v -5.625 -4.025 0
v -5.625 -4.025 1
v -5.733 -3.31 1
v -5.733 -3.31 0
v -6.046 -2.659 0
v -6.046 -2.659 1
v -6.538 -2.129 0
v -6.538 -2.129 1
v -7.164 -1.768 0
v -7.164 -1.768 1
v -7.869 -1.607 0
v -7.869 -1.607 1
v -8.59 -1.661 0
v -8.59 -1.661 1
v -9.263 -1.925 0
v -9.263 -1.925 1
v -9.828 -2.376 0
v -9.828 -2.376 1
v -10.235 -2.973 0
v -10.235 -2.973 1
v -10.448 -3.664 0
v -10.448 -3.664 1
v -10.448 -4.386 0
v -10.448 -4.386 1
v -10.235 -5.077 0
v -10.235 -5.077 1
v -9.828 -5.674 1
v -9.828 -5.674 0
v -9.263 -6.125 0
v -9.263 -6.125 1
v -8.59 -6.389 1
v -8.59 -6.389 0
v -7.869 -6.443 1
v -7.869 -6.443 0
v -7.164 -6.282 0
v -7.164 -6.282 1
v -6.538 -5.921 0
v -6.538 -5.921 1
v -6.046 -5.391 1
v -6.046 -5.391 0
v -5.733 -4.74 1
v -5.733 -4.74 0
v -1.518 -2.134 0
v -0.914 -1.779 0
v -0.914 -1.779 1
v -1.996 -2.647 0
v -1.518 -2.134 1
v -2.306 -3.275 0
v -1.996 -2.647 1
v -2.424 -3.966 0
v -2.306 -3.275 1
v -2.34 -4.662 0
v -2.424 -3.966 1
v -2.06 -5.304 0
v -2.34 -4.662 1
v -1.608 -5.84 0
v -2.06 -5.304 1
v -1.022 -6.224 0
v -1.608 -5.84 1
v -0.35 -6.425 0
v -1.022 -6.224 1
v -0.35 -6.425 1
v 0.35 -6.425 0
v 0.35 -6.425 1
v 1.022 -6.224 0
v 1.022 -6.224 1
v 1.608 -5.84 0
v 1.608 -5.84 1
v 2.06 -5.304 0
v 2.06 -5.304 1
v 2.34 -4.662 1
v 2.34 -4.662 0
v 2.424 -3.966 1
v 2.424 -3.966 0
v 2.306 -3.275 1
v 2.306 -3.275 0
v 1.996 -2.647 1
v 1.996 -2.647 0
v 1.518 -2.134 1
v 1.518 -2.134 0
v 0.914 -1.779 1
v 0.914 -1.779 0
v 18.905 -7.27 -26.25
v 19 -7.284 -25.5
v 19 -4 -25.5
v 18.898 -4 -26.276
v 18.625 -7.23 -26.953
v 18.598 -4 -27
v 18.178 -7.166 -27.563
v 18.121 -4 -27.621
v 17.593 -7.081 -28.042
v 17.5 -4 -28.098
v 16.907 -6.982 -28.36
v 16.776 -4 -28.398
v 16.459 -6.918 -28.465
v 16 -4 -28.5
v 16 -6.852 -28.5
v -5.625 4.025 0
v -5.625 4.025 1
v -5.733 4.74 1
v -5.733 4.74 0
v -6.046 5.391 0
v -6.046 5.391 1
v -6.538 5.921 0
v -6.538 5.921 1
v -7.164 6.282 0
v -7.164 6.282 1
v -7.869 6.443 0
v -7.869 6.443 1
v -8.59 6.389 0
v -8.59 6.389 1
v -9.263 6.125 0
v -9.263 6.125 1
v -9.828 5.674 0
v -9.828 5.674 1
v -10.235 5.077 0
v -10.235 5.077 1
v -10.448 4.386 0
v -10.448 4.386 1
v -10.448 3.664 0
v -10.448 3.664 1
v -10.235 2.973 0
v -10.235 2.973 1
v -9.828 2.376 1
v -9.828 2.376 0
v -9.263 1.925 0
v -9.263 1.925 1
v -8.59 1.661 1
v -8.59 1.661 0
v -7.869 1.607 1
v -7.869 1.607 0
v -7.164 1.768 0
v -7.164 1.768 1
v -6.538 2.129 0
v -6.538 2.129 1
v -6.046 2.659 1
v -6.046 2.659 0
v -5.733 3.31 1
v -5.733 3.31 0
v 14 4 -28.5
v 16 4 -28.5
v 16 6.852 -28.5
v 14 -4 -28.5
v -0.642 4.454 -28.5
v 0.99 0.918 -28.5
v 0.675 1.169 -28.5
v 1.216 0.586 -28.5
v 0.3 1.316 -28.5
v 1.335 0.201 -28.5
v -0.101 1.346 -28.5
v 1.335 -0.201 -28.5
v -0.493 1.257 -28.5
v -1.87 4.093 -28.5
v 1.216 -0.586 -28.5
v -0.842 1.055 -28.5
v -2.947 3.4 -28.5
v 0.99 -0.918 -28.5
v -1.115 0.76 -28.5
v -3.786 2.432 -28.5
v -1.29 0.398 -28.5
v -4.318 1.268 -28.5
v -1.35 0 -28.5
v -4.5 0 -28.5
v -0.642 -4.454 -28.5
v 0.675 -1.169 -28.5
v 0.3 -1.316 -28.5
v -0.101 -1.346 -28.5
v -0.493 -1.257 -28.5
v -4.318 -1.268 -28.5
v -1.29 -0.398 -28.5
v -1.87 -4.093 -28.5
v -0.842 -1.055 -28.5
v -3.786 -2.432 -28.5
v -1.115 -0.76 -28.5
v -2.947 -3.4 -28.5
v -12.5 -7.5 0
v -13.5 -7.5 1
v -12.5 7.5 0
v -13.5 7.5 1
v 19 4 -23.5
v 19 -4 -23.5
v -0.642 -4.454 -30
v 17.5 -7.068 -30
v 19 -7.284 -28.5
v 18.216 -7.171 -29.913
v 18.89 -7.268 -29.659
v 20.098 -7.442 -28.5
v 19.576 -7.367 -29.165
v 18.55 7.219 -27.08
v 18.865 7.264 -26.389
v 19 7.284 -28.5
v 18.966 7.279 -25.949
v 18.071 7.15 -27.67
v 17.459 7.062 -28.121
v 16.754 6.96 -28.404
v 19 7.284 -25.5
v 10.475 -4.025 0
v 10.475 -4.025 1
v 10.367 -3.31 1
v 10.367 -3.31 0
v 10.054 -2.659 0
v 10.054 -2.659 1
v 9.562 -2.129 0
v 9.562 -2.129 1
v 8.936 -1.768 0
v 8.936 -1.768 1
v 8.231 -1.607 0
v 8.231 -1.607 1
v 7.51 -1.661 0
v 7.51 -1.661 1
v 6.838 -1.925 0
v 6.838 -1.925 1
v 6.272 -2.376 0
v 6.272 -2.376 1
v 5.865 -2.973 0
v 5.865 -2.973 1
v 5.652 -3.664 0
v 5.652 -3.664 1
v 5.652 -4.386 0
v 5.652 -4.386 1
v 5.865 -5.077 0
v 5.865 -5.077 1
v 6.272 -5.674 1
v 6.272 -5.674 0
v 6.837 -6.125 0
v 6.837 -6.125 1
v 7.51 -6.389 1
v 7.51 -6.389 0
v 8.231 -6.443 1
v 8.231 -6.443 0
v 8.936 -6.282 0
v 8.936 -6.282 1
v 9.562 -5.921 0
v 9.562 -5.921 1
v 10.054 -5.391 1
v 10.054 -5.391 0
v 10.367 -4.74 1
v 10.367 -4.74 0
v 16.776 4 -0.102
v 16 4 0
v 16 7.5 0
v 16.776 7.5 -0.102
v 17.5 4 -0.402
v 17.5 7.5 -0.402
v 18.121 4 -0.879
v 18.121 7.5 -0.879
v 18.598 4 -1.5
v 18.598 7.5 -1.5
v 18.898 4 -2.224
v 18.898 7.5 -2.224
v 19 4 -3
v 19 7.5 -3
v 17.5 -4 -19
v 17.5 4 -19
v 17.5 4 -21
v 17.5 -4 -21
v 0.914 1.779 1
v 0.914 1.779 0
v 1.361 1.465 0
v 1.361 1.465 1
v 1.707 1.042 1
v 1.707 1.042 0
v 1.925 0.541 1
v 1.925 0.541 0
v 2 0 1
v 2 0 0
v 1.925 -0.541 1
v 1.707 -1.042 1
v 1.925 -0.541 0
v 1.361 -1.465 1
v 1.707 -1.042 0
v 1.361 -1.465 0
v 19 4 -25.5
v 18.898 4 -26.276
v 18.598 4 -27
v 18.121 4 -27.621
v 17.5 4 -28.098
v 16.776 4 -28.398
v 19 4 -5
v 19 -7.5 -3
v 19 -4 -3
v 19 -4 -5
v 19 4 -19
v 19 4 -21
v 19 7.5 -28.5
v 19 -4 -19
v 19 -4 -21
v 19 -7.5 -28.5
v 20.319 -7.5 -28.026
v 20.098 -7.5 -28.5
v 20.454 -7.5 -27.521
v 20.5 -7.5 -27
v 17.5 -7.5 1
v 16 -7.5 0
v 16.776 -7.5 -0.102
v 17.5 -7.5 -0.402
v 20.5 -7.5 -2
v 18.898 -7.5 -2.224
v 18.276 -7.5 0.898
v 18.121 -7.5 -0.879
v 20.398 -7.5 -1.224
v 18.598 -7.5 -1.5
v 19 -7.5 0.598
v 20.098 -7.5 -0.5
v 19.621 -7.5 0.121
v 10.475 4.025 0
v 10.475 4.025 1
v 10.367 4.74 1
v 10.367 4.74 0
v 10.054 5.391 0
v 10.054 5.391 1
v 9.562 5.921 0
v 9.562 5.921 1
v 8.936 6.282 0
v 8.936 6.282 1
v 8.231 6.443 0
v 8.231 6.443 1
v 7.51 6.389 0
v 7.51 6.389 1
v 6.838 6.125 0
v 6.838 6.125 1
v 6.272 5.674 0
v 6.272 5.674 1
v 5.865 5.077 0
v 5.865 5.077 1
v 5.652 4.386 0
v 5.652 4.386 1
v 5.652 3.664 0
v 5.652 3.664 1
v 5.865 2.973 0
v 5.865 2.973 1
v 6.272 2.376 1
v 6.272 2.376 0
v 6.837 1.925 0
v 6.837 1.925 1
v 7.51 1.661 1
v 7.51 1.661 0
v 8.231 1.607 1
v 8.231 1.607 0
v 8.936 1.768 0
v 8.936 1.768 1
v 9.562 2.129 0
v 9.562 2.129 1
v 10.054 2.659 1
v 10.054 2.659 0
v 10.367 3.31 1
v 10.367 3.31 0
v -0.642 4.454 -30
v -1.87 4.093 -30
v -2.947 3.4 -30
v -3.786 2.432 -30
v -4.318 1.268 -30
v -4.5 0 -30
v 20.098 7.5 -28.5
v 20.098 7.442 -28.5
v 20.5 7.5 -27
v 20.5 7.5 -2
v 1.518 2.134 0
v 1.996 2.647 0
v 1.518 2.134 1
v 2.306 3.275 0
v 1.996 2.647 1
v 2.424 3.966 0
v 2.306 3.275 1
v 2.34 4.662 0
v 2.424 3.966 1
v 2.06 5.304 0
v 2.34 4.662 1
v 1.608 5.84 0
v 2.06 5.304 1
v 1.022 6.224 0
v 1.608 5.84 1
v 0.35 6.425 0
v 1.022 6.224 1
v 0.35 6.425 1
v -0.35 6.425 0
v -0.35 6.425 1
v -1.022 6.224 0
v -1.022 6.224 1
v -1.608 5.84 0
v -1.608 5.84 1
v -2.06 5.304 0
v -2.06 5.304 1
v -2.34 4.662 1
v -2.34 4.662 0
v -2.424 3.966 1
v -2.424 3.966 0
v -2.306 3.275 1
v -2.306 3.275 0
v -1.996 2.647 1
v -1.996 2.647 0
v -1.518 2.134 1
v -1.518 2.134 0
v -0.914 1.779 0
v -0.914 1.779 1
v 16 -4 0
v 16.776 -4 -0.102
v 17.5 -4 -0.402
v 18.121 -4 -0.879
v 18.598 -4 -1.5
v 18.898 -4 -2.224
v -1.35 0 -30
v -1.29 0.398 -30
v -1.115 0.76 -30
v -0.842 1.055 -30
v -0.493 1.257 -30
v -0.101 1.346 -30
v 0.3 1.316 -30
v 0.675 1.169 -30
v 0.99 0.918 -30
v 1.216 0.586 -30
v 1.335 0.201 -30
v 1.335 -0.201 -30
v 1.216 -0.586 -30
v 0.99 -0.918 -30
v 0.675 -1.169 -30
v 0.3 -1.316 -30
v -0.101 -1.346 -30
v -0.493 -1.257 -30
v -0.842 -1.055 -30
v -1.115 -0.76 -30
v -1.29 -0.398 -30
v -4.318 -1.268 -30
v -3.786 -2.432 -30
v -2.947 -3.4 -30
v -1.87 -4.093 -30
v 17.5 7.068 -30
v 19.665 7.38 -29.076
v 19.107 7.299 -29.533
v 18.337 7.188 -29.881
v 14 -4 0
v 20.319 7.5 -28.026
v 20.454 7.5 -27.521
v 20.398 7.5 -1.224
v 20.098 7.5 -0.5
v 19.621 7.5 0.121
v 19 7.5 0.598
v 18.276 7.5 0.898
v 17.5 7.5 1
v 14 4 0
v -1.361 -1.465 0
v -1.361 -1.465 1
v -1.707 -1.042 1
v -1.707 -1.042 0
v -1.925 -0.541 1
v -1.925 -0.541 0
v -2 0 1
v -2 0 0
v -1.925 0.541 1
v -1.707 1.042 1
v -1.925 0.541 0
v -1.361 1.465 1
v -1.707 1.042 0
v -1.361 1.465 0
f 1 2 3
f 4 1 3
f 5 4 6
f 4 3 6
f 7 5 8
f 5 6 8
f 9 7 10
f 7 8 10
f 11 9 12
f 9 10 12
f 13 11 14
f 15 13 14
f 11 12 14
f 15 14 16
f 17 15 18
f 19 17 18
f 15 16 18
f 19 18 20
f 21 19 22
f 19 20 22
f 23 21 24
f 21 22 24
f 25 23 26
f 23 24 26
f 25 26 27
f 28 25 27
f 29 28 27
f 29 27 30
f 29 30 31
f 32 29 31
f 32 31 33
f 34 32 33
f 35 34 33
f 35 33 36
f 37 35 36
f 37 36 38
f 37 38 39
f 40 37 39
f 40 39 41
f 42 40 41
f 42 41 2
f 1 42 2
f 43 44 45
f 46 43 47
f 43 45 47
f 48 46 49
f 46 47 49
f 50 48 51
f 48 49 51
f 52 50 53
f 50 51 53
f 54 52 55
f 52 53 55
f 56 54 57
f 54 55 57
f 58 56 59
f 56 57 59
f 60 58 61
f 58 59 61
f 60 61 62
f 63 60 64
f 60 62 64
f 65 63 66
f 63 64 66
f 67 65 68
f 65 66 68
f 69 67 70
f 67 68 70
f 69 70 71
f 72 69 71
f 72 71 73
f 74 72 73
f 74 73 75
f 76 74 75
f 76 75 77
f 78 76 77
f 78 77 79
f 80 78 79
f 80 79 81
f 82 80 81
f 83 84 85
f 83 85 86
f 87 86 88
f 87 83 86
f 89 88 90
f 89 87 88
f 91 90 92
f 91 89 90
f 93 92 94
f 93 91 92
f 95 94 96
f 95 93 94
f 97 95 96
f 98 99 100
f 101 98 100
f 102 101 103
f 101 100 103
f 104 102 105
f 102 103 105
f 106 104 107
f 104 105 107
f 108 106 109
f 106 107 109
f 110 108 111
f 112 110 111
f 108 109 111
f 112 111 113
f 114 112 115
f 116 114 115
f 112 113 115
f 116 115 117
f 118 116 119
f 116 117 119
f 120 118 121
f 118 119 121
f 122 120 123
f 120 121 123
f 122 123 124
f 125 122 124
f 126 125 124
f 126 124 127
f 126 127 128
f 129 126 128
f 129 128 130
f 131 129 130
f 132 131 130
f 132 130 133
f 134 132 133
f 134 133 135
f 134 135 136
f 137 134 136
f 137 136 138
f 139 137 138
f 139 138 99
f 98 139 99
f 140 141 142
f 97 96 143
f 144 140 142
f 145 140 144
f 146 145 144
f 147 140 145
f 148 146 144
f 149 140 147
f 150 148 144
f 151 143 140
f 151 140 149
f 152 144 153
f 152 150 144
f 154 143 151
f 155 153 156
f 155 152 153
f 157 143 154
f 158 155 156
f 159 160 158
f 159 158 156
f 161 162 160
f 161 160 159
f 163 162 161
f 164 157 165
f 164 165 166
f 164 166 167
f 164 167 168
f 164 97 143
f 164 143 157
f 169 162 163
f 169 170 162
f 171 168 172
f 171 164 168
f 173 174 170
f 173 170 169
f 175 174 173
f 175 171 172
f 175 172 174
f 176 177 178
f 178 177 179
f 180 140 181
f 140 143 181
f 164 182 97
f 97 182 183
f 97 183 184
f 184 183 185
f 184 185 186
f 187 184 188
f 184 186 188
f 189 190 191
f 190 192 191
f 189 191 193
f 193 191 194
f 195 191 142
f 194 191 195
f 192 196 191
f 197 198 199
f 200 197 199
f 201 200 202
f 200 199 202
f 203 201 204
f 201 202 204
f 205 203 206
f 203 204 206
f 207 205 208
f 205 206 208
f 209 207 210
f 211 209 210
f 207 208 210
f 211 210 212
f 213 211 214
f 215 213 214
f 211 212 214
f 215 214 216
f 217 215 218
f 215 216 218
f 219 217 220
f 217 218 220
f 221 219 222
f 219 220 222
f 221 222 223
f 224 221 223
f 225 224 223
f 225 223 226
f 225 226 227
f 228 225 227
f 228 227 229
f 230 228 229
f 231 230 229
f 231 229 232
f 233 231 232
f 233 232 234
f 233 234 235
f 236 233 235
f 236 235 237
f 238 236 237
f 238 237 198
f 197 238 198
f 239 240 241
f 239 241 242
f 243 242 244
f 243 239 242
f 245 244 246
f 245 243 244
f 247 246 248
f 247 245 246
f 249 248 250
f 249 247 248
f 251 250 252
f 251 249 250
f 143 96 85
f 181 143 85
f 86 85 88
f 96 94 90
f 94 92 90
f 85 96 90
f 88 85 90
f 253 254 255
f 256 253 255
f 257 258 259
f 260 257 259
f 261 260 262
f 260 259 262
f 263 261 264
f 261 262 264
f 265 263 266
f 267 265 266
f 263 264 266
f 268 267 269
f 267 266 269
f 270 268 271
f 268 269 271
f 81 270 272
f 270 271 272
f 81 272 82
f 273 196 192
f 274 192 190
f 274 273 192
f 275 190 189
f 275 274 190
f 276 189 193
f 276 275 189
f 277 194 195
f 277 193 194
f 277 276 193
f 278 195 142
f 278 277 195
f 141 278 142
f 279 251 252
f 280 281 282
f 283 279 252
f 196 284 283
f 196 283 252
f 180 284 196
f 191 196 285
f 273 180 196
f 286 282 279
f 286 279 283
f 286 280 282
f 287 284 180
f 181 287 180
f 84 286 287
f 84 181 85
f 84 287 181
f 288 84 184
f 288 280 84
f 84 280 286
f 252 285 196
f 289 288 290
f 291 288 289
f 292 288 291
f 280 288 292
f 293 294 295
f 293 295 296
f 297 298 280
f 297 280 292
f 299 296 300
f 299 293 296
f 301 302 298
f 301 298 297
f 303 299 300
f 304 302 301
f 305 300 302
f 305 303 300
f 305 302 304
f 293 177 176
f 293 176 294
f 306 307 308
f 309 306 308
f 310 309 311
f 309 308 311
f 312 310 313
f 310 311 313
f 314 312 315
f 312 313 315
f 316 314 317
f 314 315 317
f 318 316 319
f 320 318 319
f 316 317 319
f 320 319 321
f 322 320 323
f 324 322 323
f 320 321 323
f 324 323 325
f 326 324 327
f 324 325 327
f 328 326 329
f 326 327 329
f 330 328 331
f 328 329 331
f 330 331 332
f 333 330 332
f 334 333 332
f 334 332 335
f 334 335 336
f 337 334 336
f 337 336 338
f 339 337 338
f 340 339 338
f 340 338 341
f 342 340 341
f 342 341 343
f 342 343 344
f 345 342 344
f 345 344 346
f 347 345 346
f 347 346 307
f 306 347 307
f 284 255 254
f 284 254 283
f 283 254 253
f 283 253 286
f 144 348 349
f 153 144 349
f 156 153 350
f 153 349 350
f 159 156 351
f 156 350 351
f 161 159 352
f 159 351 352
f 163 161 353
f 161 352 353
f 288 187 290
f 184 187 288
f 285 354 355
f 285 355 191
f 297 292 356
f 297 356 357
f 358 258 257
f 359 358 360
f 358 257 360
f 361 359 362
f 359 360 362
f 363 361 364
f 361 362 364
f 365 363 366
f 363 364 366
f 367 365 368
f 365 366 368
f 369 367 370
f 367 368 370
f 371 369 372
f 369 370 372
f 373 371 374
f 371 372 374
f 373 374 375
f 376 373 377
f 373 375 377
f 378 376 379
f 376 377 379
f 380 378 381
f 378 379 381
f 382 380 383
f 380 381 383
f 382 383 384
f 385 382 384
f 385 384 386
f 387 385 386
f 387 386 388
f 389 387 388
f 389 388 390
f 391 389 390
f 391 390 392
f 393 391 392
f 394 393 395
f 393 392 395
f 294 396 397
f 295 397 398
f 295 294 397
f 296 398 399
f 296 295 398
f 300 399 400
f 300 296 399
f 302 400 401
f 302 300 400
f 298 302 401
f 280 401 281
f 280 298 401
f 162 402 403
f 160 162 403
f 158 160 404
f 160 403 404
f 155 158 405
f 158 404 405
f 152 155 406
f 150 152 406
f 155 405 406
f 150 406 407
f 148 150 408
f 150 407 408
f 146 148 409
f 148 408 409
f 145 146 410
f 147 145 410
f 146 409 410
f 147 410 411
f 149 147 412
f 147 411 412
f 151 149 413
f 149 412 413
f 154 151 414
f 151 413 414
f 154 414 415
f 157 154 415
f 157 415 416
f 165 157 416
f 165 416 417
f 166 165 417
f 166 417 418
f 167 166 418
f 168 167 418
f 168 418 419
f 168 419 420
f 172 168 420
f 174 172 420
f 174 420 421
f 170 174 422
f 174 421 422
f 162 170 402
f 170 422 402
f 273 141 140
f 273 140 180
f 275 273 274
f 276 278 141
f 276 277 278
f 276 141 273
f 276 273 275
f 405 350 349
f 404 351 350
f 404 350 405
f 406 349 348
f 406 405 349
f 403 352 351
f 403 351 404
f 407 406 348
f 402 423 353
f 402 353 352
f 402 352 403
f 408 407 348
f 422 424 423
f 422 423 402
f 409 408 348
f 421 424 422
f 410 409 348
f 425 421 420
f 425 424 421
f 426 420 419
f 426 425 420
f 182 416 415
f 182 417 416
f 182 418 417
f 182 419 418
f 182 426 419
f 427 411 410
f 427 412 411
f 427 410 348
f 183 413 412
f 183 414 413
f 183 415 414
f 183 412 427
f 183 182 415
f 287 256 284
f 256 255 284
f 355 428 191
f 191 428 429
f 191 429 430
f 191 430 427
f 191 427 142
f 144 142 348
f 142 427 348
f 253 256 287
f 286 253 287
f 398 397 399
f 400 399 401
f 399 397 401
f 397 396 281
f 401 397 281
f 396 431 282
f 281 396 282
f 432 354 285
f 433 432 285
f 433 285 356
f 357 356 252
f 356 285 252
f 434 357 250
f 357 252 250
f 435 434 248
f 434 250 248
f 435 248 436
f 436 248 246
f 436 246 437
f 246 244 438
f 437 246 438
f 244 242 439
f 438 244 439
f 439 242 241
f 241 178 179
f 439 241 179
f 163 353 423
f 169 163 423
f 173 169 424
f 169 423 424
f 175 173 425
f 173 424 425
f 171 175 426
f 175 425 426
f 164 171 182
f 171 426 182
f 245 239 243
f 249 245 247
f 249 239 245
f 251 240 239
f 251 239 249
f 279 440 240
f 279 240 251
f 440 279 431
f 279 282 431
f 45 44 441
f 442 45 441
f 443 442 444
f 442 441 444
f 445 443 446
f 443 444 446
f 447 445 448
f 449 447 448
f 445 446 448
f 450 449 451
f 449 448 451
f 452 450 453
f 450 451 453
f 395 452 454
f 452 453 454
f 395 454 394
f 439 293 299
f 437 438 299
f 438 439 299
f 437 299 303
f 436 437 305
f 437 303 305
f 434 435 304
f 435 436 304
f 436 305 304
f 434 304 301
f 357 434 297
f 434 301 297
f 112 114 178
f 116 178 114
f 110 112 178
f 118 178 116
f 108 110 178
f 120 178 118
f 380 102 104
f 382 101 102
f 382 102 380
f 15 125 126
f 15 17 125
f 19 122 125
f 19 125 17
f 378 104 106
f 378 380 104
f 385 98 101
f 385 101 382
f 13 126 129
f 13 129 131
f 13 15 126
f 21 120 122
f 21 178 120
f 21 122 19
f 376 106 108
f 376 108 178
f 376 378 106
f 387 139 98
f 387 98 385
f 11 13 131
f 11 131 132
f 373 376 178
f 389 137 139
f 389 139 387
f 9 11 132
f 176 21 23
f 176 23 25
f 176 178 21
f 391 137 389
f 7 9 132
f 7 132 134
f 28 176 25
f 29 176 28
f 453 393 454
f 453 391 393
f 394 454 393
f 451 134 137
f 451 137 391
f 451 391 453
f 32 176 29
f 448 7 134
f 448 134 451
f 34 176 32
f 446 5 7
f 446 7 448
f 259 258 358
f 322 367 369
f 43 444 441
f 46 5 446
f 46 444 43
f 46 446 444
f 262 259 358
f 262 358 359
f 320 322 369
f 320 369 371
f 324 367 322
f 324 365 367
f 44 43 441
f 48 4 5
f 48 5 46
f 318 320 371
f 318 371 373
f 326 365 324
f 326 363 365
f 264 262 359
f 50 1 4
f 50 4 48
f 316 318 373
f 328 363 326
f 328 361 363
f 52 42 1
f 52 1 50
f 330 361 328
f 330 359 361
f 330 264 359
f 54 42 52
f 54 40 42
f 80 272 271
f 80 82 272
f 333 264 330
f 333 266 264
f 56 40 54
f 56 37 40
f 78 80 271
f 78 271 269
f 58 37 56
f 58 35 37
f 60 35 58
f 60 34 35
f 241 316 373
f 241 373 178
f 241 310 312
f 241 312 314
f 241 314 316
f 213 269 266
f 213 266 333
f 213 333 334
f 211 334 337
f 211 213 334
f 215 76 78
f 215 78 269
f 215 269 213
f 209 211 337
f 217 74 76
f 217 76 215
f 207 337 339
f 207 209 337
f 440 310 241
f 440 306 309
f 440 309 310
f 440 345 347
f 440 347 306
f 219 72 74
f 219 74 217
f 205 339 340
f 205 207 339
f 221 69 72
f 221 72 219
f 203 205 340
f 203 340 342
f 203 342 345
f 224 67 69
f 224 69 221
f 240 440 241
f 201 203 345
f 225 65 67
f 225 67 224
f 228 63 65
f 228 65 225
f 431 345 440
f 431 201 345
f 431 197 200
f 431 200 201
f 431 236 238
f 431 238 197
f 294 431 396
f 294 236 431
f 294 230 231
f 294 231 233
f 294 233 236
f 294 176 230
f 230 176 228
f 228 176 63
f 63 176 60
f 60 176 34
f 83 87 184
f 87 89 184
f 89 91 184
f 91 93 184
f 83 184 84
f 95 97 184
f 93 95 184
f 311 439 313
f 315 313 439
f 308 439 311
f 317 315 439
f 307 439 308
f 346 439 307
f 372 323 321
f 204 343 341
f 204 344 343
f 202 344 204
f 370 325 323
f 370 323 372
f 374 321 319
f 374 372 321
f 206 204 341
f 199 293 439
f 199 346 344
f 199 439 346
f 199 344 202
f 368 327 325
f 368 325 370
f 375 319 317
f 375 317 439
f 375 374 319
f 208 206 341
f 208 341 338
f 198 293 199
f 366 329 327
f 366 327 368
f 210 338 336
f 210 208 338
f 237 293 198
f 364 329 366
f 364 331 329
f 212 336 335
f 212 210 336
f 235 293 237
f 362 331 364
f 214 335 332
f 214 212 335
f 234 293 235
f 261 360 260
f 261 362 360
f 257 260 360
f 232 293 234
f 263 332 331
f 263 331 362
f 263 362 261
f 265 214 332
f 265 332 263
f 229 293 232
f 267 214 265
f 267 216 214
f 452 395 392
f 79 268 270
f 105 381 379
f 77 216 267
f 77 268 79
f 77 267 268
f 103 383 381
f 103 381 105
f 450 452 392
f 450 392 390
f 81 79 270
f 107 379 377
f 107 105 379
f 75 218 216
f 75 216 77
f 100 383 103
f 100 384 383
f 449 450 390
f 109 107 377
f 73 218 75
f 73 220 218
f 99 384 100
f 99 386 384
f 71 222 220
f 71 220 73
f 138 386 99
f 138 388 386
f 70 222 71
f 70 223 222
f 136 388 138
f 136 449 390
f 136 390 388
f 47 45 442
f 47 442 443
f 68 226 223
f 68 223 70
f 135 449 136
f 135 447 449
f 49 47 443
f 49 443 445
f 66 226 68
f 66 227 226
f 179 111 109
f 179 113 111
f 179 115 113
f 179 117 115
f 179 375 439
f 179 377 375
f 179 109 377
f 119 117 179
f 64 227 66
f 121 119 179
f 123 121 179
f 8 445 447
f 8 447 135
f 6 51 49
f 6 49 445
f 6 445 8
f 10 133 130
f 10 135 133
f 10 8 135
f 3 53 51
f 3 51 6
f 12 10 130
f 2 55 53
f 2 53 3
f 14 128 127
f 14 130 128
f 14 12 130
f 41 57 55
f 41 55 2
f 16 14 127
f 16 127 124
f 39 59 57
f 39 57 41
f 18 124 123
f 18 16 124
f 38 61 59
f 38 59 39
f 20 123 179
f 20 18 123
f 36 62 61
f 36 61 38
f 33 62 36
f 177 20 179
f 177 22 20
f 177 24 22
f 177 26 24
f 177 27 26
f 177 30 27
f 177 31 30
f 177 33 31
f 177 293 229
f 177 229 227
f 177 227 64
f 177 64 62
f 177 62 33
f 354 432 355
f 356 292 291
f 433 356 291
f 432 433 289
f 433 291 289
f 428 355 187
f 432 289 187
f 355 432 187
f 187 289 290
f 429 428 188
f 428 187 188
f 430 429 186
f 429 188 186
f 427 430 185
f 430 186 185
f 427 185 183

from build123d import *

# Parameters (mm, degrees)
SKETCH_1_W          = 27
SKETCH_1_H          = 15
EXTRUDE_1_DEPTH     = 1
SKETCH_2_R          = 2.425
CUT_EXTRUDE_1_DEPTH = 16.475787541
EXTRUDE_2_DEPTH     = 15
SKETCH_6_W          = 1.5
SKETCH_6_H          = 2
EXTRUDE_3_DEPTH     = 4
SKETCH_7_R          = 1.35
CUT_EXTRUDE_3_DEPTH = 1.5
FILLET_1_R          = 3
CHAMFER_1_SIZE      = 1
CUT_EXTRUDE_4_REACH = 39.101
SKETCH_8_R          = 2


# Some blends are built 0.0001 mm under size
with BuildPart() as part:
    # 草图1 → 凸台-拉伸1 (new body)
    with BuildSketch(Plane.XY):
        Rectangle(SKETCH_1_W, SKETCH_1_H)
    extrude(amount=EXTRUDE_1_DEPTH)

    # 草图2 → 切除-拉伸1 (cut, through all)
    with BuildSketch(Plane.XY.offset(1)):
        with Locations((0, 4.025)):
            Circle(SKETCH_2_R)
        with Locations((0, -4.025)):
            Circle(SKETCH_2_R)
        with Locations((8.05, 4.025)):
            Circle(SKETCH_2_R)
        with Locations((8.05, -4.025)):
            Circle(SKETCH_2_R)
        with Locations((-8.05, 4.025)):
            Circle(SKETCH_2_R)
        with Locations((-8.05, -4.025)):
            Circle(SKETCH_2_R)
    extrude(amount=-CUT_EXTRUDE_1_DEPTH, mode=Mode.SUBTRACT)

    # 草图3 → 凸台-拉伸2 (add)
    with BuildSketch(Plane.XZ.offset(7.5)):
        Polygon((13.5, 0), (19, 0), (19, -28.5), (-4.5, -28.5), (-4.5, -30), (20.5, -30), (20.5, 1), (13.5, 1), align=None)
    extrude(amount=-EXTRUDE_2_DEPTH)

    # 草图6 → 凸台-拉伸3 (add, symmetric)
    with BuildSketch(Plane(origin=(0, 0, 0), x_dir=(1, 0, 0), z_dir=(0, 1, 0))):
        Polygon((19, 0), (19, 5), (14, 0), align=None)
        Polygon((19, 28.5), (14, 28.5), (19, 23.5), align=None)
        with Locations((18.25, 20)):
            Rectangle(SKETCH_6_W, SKETCH_6_H)
    extrude(amount=EXTRUDE_3_DEPTH, both=True)

    # 草图7 → 切除-拉伸3 (cut)
    with BuildSketch(Plane(origin=(0, 0, -30), x_dir=(-1, 0, 0), z_dir=(0, 0, -1))):
        with BuildLine():
            ThreePointArc((4.5, 0), (3.401301202, -2.946379157), (0.641711051, -4.454010207))
            Line((0.641711051, -4.454010207), (-20.5, -7.5))
            Line((-20.5, -7.5), (4.5, -7.5))
            Line((4.5, -7.5), (4.5, 0))
        make_face()
        with BuildLine():
            Line((-20.5, 7.5), (0.641711051, 4.454010207))
            ThreePointArc((0.641711051, 4.454010207), (3.401301202, 2.946379157), (4.5, 0))
            Line((4.5, 0), (4.5, 7.5))
            Line((4.5, 7.5), (-20.5, 7.5))
        make_face()
        Circle(SKETCH_7_R)
    extrude(amount=-CUT_EXTRUDE_3_DEPTH, mode=Mode.SUBTRACT)

    # 圆角1
    # the kernel refuses this fillet: 3 mm, written as the material it adds along each edge
    with BuildSketch(Plane(origin=(19, -3.5, -28.5), x_dir=(-1, 0, 0), z_dir=(0, 1, 0))) as fillet_1_piece_1_section:
        with BuildLine():
            CenterArc((FILLET_1_R, FILLET_1_R), FILLET_1_R, 180, 90)
            Line((0, FILLET_1_R), (0, 0))
            Line((0, 0), (FILLET_1_R, 0))
        make_face()
    fillet_1_piece_1 = extrude(amount=18.283887658, mode=Mode.PRIVATE)
    fillet_1_piece_1 = split(fillet_1_piece_1, bisect_by=Plane(origin=(18.119115161, 7.156974268, -27.821481802), z_dir=(0.1426024558755584, -0.9897800460598605, 0)), keep=Keep.TOP, mode=Mode.PRIVATE)
    add(fillet_1_piece_1)
    with BuildSketch(Plane(origin=(19, -3.5, 0), x_dir=(0, 0, -1), z_dir=(0, 1, 0)), Plane(origin=(19, -7.5, 0), x_dir=(0, 0, -1), z_dir=(0, 1, 0))) as fillet_1_piece_2:
        with BuildLine():
            CenterArc((FILLET_1_R, FILLET_1_R), FILLET_1_R, 180, 90)
            Line((0, FILLET_1_R), (0, 0))
            Line((0, 0), (FILLET_1_R, 0))
        make_face()
    extrude(amount=11)
    with BuildSketch(Plane(origin=(19, -14.783887658, -28.5), x_dir=(-1, 0, 0), z_dir=(0, 1, 0))) as fillet_1_piece_3_section:
        with BuildLine():
            CenterArc((FILLET_1_R, FILLET_1_R), FILLET_1_R, 180, 90)
            Line((0, FILLET_1_R), (0, 0))
            Line((0, 0), (FILLET_1_R, 0))
        make_face()
    fillet_1_piece_3 = extrude(amount=18.283887658, mode=Mode.PRIVATE)
    fillet_1_piece_3 = split(fillet_1_piece_3, bisect_by=Plane(origin=(18.119115161, -7.156974268, -27.821481802), z_dir=(0.1426024558755584, 0.9897800460598605, 0)), keep=Keep.TOP, mode=Mode.PRIVATE)
    add(fillet_1_piece_3)
    # the kernel refuses this fillet: 3 mm, written as the material it takes off along each edge
    with BuildSketch(Plane(origin=(20.5, -15, 1), x_dir=(0, 0, -1), z_dir=(0, 1, 0))) as fillet_1_2_piece_1:
        with BuildLine():
            CenterArc((FILLET_1_R, FILLET_1_R), FILLET_1_R, 180, 90)
            Line((0, FILLET_1_R), (0, 0))
            Line((0, 0), (FILLET_1_R, 0))
        make_face()
    extrude(amount=30, mode=Mode.SUBTRACT)
    with BuildSketch(Plane(origin=(20.5, -15, -30), x_dir=(0, 0, 1), z_dir=(0, 1, 0))) as fillet_1_2_piece_2:
        with BuildLine():
            CenterArc((FILLET_1_R, -FILLET_1_R), FILLET_1_R, 90, 90)
            Line((0, -FILLET_1_R), (0, 0))
            Line((0, 0), (FILLET_1_R, 0))
        make_face()
    extrude(amount=30, mode=Mode.SUBTRACT)

    # 倒角1
    chamfer_1_edges = [part.edges().sort_by_distance(p)[0] for p in [
        (-13.5, 0, 0),
    ]]
    chamfer(chamfer_1_edges, length=CHAMFER_1_SIZE - 0.0001)  # a hair under: the kernel refuses the full size

    # 草图8 → 切除-拉伸4 (cut, up to next)
    with BuildSketch(Plane(origin=(0, 0, 0), x_dir=(-1, 0, 0), z_dir=(0, 0, -1)), mode=Mode.PRIVATE) as cut_extrude_4_sk1:
        Circle(SKETCH_8_R)
    cut_extrude_4_tool1 = extrude(cut_extrude_4_sk1.sketch, amount=-CUT_EXTRUDE_4_REACH, mode=Mode.PRIVATE) & part.part
    add(cut_extrude_4_tool1.solids().sort_by_distance((0, 0, 0))[0], mode=Mode.SUBTRACT)


solid = part.part
